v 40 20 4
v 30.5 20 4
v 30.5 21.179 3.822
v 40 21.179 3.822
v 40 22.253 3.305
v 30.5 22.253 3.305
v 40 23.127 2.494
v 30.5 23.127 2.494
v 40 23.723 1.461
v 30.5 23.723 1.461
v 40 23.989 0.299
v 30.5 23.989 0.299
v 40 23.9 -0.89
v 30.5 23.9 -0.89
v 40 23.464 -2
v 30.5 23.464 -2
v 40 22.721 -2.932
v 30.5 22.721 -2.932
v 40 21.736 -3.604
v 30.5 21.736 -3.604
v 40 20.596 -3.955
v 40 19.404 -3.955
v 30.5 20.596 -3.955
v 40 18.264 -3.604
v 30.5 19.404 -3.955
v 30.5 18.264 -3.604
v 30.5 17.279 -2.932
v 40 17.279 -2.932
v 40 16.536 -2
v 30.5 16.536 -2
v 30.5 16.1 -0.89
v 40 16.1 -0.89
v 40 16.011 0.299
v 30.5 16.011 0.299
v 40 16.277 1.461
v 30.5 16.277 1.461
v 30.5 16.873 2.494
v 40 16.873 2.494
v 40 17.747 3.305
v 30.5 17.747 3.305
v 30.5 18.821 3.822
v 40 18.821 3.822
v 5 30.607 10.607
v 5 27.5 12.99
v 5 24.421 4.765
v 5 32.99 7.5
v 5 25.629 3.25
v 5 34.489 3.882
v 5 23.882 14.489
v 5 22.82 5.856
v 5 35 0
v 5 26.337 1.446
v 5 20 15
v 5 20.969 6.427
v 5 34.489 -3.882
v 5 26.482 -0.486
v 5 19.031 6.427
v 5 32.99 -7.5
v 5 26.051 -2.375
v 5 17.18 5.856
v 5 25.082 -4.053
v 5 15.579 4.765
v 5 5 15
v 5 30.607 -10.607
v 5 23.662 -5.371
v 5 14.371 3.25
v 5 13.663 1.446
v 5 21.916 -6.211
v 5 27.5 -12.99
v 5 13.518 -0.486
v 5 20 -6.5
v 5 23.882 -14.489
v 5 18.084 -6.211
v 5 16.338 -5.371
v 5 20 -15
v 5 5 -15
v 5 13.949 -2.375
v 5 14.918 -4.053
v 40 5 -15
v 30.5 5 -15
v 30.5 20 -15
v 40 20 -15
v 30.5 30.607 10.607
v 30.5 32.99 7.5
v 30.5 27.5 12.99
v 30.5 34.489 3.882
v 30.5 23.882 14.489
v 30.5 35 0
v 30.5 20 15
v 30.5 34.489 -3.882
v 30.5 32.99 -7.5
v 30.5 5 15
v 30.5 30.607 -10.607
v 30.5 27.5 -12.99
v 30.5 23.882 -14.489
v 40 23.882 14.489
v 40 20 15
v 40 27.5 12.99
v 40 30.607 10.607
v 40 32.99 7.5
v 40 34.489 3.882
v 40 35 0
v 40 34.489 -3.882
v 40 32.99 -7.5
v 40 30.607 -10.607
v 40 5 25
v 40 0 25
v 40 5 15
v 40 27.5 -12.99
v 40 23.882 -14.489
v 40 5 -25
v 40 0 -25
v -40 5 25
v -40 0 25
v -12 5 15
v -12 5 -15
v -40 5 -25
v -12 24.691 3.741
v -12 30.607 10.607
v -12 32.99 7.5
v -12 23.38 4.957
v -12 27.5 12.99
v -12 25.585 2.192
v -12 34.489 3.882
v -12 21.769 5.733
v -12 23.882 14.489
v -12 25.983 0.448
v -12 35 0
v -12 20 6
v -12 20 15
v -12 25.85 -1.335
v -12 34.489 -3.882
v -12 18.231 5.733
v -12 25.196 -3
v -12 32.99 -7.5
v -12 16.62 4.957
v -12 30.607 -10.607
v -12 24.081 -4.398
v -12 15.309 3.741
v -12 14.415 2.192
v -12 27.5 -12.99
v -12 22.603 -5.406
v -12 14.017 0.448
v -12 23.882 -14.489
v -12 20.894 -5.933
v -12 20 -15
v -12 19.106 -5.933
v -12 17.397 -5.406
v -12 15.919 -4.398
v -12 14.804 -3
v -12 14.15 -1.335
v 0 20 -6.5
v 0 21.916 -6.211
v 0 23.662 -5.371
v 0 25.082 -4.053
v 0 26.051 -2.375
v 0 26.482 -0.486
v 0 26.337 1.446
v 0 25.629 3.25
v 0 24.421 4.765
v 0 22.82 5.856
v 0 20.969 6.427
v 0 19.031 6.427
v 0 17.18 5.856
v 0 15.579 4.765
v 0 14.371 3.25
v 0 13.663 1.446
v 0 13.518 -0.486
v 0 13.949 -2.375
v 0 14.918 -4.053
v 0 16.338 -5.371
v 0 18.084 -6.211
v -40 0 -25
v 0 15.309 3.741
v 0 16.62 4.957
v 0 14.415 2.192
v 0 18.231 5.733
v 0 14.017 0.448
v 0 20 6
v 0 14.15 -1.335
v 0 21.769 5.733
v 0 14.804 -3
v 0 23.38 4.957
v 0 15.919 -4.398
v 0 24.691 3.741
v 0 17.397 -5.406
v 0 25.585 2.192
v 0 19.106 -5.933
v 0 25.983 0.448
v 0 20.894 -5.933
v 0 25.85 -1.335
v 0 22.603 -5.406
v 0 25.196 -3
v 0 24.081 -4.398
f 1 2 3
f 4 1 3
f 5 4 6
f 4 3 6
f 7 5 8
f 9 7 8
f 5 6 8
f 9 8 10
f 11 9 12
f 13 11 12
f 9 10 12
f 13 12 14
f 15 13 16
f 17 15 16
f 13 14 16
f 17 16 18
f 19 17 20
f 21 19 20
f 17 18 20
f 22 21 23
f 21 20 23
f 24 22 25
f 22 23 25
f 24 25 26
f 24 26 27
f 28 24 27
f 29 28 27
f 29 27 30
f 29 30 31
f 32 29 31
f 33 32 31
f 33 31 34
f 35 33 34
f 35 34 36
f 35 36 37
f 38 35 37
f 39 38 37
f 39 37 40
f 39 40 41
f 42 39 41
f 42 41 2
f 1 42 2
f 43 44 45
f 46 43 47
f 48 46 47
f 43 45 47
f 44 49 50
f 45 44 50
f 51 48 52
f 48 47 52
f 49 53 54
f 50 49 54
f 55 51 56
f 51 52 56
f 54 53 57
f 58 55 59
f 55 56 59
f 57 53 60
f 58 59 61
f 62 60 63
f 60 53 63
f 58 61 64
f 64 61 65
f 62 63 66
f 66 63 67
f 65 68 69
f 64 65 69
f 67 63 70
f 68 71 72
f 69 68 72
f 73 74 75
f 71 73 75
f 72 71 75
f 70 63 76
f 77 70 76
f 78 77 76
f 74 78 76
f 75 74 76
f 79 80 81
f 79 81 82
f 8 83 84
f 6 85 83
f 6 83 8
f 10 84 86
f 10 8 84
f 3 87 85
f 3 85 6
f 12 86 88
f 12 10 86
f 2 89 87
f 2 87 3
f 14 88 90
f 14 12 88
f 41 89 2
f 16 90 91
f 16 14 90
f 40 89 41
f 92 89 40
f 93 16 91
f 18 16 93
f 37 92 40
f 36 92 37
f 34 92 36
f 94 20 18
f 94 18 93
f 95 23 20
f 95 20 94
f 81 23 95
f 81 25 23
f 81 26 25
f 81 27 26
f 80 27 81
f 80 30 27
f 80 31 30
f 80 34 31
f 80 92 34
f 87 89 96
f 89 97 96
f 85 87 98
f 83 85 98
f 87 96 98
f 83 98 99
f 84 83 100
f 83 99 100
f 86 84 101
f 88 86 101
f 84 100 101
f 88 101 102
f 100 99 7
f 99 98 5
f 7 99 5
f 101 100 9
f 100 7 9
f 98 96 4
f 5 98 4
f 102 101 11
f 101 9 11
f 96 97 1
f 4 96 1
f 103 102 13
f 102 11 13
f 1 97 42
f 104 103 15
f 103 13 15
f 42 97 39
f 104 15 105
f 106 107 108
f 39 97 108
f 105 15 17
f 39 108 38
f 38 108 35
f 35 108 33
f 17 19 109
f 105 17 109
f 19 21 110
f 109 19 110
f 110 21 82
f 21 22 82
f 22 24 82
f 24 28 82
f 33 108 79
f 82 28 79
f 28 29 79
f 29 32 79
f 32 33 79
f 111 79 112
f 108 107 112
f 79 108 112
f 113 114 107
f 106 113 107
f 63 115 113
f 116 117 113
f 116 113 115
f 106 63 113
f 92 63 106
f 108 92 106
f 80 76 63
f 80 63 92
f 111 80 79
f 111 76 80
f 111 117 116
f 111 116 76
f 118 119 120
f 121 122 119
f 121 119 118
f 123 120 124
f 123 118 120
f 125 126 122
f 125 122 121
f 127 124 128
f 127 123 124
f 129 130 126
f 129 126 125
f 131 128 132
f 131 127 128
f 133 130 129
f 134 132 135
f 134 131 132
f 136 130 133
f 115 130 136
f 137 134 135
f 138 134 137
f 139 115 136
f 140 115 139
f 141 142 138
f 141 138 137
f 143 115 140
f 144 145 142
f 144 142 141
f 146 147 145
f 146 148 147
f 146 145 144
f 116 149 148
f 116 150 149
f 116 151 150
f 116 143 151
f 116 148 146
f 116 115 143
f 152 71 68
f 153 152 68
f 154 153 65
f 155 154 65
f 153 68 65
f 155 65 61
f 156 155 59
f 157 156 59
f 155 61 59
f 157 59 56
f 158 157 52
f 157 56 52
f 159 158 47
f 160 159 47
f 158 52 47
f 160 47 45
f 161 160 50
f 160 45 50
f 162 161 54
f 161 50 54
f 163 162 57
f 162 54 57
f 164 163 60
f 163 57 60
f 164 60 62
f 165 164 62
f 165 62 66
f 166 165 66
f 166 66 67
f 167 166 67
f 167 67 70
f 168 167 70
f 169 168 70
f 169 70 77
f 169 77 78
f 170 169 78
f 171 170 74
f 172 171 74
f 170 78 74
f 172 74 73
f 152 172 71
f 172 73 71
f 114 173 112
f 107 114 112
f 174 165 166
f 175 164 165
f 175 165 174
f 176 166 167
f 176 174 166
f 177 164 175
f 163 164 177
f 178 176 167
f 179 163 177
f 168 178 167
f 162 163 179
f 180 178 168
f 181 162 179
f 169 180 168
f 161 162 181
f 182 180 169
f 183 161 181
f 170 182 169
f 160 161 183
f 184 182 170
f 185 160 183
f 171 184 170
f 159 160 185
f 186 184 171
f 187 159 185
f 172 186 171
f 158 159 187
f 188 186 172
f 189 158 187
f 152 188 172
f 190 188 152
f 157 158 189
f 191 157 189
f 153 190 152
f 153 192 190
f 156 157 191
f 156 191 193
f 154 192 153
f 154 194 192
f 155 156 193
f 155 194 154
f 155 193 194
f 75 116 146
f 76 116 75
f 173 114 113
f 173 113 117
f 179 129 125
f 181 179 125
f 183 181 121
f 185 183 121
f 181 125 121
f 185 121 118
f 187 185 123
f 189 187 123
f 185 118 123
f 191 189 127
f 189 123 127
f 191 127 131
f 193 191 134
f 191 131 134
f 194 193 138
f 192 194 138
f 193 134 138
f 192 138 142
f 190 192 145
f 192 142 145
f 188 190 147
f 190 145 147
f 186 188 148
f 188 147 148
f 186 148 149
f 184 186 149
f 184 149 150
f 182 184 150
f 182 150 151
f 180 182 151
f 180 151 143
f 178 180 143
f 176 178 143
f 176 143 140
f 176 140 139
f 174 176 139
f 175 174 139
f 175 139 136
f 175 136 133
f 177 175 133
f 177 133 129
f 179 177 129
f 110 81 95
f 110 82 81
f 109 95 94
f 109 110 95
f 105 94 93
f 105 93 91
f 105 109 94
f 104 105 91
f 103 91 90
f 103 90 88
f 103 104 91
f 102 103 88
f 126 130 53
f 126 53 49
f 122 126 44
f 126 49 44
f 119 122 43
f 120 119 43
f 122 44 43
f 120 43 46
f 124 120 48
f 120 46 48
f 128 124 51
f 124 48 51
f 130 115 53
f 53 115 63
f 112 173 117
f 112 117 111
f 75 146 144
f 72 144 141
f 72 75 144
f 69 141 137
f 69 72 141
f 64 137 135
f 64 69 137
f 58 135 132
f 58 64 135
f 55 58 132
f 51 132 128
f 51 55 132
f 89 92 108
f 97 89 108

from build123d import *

# Parameters (mm, degrees)
SKETCH1_W           = 80
SKETCH1_H           = 50
BOSS_EXTRUDE1_DEPTH = 5
SKETCH2_W           = 17
SKETCH2_H           = 30
SKETCH2_W_2         = 9.5
BOSS_EXTRUDE2_DEPTH = 30
FILLET1_R           = 15
SKETCH3_R           = 4
CUT_EXTRUDE1_DEPTH  = 30
SKETCH4_R           = 6.5
CUT_EXTRUDE2_DEPTH  = 5
SKETCH5_R           = 6
CUT_EXTRUDE3_DEPTH  = 14


with BuildPart() as part:
    # Sketch1 → Boss-Extrude1 (new body)
    with BuildSketch(Plane(origin=(0, 0, 0), x_dir=(1, 0, 0), z_dir=(0, 1, 0))):
        Rectangle(SKETCH1_W, SKETCH1_H)
    extrude(amount=BOSS_EXTRUDE1_DEPTH)

    # Sketch2 → Boss-Extrude2 (add)
    with BuildSketch(Plane(origin=(0, 5, 0), x_dir=(1, 0, 0), z_dir=(0, 1, 0))):
        with Locations((-3.5, 0)):
            Rectangle(SKETCH2_W, SKETCH2_H)
        with Locations((35.25, 0)):
            Rectangle(SKETCH2_W_2, SKETCH2_H)
    extrude(amount=BOSS_EXTRUDE2_DEPTH)

    # Fillet1
    fillet1_edges = [part.edges().sort_by_distance(p)[0] for p in [
        (-3.5, 35, -15),
        (-3.5, 35, 15),
        (35.25, 35, -15),
        (35.25, 35, 15),
    ]]
    fillet(fillet1_edges, radius=FILLET1_R - 0.0001)  # a hair under: the kernel refuses the full size

    # Sketch3 → Cut-Extrude1 (cut)
    with BuildSketch(Plane.ZY.offset(-30.5)):
        with Locations((0, 20)):
            Circle(SKETCH3_R)
    extrude(amount=-CUT_EXTRUDE1_DEPTH, mode=Mode.SUBTRACT)

    # Sketch4 → Cut-Extrude2 (cut)
    with BuildSketch(Plane(origin=(5, 0, 0), x_dir=(0, 0, -1), z_dir=(1, 0, 0))):
        with Locations((0, 20)):
            Circle(SKETCH4_R)
    extrude(amount=-CUT_EXTRUDE2_DEPTH, mode=Mode.SUBTRACT)

    # Sketch5 → Cut-Extrude3 (cut)
    with BuildSketch(Plane.ZY.offset(12)):
        with Locations((0, 20)):
            Circle(SKETCH5_R)
    extrude(amount=-CUT_EXTRUDE3_DEPTH, mode=Mode.SUBTRACT)


solid = part.part
